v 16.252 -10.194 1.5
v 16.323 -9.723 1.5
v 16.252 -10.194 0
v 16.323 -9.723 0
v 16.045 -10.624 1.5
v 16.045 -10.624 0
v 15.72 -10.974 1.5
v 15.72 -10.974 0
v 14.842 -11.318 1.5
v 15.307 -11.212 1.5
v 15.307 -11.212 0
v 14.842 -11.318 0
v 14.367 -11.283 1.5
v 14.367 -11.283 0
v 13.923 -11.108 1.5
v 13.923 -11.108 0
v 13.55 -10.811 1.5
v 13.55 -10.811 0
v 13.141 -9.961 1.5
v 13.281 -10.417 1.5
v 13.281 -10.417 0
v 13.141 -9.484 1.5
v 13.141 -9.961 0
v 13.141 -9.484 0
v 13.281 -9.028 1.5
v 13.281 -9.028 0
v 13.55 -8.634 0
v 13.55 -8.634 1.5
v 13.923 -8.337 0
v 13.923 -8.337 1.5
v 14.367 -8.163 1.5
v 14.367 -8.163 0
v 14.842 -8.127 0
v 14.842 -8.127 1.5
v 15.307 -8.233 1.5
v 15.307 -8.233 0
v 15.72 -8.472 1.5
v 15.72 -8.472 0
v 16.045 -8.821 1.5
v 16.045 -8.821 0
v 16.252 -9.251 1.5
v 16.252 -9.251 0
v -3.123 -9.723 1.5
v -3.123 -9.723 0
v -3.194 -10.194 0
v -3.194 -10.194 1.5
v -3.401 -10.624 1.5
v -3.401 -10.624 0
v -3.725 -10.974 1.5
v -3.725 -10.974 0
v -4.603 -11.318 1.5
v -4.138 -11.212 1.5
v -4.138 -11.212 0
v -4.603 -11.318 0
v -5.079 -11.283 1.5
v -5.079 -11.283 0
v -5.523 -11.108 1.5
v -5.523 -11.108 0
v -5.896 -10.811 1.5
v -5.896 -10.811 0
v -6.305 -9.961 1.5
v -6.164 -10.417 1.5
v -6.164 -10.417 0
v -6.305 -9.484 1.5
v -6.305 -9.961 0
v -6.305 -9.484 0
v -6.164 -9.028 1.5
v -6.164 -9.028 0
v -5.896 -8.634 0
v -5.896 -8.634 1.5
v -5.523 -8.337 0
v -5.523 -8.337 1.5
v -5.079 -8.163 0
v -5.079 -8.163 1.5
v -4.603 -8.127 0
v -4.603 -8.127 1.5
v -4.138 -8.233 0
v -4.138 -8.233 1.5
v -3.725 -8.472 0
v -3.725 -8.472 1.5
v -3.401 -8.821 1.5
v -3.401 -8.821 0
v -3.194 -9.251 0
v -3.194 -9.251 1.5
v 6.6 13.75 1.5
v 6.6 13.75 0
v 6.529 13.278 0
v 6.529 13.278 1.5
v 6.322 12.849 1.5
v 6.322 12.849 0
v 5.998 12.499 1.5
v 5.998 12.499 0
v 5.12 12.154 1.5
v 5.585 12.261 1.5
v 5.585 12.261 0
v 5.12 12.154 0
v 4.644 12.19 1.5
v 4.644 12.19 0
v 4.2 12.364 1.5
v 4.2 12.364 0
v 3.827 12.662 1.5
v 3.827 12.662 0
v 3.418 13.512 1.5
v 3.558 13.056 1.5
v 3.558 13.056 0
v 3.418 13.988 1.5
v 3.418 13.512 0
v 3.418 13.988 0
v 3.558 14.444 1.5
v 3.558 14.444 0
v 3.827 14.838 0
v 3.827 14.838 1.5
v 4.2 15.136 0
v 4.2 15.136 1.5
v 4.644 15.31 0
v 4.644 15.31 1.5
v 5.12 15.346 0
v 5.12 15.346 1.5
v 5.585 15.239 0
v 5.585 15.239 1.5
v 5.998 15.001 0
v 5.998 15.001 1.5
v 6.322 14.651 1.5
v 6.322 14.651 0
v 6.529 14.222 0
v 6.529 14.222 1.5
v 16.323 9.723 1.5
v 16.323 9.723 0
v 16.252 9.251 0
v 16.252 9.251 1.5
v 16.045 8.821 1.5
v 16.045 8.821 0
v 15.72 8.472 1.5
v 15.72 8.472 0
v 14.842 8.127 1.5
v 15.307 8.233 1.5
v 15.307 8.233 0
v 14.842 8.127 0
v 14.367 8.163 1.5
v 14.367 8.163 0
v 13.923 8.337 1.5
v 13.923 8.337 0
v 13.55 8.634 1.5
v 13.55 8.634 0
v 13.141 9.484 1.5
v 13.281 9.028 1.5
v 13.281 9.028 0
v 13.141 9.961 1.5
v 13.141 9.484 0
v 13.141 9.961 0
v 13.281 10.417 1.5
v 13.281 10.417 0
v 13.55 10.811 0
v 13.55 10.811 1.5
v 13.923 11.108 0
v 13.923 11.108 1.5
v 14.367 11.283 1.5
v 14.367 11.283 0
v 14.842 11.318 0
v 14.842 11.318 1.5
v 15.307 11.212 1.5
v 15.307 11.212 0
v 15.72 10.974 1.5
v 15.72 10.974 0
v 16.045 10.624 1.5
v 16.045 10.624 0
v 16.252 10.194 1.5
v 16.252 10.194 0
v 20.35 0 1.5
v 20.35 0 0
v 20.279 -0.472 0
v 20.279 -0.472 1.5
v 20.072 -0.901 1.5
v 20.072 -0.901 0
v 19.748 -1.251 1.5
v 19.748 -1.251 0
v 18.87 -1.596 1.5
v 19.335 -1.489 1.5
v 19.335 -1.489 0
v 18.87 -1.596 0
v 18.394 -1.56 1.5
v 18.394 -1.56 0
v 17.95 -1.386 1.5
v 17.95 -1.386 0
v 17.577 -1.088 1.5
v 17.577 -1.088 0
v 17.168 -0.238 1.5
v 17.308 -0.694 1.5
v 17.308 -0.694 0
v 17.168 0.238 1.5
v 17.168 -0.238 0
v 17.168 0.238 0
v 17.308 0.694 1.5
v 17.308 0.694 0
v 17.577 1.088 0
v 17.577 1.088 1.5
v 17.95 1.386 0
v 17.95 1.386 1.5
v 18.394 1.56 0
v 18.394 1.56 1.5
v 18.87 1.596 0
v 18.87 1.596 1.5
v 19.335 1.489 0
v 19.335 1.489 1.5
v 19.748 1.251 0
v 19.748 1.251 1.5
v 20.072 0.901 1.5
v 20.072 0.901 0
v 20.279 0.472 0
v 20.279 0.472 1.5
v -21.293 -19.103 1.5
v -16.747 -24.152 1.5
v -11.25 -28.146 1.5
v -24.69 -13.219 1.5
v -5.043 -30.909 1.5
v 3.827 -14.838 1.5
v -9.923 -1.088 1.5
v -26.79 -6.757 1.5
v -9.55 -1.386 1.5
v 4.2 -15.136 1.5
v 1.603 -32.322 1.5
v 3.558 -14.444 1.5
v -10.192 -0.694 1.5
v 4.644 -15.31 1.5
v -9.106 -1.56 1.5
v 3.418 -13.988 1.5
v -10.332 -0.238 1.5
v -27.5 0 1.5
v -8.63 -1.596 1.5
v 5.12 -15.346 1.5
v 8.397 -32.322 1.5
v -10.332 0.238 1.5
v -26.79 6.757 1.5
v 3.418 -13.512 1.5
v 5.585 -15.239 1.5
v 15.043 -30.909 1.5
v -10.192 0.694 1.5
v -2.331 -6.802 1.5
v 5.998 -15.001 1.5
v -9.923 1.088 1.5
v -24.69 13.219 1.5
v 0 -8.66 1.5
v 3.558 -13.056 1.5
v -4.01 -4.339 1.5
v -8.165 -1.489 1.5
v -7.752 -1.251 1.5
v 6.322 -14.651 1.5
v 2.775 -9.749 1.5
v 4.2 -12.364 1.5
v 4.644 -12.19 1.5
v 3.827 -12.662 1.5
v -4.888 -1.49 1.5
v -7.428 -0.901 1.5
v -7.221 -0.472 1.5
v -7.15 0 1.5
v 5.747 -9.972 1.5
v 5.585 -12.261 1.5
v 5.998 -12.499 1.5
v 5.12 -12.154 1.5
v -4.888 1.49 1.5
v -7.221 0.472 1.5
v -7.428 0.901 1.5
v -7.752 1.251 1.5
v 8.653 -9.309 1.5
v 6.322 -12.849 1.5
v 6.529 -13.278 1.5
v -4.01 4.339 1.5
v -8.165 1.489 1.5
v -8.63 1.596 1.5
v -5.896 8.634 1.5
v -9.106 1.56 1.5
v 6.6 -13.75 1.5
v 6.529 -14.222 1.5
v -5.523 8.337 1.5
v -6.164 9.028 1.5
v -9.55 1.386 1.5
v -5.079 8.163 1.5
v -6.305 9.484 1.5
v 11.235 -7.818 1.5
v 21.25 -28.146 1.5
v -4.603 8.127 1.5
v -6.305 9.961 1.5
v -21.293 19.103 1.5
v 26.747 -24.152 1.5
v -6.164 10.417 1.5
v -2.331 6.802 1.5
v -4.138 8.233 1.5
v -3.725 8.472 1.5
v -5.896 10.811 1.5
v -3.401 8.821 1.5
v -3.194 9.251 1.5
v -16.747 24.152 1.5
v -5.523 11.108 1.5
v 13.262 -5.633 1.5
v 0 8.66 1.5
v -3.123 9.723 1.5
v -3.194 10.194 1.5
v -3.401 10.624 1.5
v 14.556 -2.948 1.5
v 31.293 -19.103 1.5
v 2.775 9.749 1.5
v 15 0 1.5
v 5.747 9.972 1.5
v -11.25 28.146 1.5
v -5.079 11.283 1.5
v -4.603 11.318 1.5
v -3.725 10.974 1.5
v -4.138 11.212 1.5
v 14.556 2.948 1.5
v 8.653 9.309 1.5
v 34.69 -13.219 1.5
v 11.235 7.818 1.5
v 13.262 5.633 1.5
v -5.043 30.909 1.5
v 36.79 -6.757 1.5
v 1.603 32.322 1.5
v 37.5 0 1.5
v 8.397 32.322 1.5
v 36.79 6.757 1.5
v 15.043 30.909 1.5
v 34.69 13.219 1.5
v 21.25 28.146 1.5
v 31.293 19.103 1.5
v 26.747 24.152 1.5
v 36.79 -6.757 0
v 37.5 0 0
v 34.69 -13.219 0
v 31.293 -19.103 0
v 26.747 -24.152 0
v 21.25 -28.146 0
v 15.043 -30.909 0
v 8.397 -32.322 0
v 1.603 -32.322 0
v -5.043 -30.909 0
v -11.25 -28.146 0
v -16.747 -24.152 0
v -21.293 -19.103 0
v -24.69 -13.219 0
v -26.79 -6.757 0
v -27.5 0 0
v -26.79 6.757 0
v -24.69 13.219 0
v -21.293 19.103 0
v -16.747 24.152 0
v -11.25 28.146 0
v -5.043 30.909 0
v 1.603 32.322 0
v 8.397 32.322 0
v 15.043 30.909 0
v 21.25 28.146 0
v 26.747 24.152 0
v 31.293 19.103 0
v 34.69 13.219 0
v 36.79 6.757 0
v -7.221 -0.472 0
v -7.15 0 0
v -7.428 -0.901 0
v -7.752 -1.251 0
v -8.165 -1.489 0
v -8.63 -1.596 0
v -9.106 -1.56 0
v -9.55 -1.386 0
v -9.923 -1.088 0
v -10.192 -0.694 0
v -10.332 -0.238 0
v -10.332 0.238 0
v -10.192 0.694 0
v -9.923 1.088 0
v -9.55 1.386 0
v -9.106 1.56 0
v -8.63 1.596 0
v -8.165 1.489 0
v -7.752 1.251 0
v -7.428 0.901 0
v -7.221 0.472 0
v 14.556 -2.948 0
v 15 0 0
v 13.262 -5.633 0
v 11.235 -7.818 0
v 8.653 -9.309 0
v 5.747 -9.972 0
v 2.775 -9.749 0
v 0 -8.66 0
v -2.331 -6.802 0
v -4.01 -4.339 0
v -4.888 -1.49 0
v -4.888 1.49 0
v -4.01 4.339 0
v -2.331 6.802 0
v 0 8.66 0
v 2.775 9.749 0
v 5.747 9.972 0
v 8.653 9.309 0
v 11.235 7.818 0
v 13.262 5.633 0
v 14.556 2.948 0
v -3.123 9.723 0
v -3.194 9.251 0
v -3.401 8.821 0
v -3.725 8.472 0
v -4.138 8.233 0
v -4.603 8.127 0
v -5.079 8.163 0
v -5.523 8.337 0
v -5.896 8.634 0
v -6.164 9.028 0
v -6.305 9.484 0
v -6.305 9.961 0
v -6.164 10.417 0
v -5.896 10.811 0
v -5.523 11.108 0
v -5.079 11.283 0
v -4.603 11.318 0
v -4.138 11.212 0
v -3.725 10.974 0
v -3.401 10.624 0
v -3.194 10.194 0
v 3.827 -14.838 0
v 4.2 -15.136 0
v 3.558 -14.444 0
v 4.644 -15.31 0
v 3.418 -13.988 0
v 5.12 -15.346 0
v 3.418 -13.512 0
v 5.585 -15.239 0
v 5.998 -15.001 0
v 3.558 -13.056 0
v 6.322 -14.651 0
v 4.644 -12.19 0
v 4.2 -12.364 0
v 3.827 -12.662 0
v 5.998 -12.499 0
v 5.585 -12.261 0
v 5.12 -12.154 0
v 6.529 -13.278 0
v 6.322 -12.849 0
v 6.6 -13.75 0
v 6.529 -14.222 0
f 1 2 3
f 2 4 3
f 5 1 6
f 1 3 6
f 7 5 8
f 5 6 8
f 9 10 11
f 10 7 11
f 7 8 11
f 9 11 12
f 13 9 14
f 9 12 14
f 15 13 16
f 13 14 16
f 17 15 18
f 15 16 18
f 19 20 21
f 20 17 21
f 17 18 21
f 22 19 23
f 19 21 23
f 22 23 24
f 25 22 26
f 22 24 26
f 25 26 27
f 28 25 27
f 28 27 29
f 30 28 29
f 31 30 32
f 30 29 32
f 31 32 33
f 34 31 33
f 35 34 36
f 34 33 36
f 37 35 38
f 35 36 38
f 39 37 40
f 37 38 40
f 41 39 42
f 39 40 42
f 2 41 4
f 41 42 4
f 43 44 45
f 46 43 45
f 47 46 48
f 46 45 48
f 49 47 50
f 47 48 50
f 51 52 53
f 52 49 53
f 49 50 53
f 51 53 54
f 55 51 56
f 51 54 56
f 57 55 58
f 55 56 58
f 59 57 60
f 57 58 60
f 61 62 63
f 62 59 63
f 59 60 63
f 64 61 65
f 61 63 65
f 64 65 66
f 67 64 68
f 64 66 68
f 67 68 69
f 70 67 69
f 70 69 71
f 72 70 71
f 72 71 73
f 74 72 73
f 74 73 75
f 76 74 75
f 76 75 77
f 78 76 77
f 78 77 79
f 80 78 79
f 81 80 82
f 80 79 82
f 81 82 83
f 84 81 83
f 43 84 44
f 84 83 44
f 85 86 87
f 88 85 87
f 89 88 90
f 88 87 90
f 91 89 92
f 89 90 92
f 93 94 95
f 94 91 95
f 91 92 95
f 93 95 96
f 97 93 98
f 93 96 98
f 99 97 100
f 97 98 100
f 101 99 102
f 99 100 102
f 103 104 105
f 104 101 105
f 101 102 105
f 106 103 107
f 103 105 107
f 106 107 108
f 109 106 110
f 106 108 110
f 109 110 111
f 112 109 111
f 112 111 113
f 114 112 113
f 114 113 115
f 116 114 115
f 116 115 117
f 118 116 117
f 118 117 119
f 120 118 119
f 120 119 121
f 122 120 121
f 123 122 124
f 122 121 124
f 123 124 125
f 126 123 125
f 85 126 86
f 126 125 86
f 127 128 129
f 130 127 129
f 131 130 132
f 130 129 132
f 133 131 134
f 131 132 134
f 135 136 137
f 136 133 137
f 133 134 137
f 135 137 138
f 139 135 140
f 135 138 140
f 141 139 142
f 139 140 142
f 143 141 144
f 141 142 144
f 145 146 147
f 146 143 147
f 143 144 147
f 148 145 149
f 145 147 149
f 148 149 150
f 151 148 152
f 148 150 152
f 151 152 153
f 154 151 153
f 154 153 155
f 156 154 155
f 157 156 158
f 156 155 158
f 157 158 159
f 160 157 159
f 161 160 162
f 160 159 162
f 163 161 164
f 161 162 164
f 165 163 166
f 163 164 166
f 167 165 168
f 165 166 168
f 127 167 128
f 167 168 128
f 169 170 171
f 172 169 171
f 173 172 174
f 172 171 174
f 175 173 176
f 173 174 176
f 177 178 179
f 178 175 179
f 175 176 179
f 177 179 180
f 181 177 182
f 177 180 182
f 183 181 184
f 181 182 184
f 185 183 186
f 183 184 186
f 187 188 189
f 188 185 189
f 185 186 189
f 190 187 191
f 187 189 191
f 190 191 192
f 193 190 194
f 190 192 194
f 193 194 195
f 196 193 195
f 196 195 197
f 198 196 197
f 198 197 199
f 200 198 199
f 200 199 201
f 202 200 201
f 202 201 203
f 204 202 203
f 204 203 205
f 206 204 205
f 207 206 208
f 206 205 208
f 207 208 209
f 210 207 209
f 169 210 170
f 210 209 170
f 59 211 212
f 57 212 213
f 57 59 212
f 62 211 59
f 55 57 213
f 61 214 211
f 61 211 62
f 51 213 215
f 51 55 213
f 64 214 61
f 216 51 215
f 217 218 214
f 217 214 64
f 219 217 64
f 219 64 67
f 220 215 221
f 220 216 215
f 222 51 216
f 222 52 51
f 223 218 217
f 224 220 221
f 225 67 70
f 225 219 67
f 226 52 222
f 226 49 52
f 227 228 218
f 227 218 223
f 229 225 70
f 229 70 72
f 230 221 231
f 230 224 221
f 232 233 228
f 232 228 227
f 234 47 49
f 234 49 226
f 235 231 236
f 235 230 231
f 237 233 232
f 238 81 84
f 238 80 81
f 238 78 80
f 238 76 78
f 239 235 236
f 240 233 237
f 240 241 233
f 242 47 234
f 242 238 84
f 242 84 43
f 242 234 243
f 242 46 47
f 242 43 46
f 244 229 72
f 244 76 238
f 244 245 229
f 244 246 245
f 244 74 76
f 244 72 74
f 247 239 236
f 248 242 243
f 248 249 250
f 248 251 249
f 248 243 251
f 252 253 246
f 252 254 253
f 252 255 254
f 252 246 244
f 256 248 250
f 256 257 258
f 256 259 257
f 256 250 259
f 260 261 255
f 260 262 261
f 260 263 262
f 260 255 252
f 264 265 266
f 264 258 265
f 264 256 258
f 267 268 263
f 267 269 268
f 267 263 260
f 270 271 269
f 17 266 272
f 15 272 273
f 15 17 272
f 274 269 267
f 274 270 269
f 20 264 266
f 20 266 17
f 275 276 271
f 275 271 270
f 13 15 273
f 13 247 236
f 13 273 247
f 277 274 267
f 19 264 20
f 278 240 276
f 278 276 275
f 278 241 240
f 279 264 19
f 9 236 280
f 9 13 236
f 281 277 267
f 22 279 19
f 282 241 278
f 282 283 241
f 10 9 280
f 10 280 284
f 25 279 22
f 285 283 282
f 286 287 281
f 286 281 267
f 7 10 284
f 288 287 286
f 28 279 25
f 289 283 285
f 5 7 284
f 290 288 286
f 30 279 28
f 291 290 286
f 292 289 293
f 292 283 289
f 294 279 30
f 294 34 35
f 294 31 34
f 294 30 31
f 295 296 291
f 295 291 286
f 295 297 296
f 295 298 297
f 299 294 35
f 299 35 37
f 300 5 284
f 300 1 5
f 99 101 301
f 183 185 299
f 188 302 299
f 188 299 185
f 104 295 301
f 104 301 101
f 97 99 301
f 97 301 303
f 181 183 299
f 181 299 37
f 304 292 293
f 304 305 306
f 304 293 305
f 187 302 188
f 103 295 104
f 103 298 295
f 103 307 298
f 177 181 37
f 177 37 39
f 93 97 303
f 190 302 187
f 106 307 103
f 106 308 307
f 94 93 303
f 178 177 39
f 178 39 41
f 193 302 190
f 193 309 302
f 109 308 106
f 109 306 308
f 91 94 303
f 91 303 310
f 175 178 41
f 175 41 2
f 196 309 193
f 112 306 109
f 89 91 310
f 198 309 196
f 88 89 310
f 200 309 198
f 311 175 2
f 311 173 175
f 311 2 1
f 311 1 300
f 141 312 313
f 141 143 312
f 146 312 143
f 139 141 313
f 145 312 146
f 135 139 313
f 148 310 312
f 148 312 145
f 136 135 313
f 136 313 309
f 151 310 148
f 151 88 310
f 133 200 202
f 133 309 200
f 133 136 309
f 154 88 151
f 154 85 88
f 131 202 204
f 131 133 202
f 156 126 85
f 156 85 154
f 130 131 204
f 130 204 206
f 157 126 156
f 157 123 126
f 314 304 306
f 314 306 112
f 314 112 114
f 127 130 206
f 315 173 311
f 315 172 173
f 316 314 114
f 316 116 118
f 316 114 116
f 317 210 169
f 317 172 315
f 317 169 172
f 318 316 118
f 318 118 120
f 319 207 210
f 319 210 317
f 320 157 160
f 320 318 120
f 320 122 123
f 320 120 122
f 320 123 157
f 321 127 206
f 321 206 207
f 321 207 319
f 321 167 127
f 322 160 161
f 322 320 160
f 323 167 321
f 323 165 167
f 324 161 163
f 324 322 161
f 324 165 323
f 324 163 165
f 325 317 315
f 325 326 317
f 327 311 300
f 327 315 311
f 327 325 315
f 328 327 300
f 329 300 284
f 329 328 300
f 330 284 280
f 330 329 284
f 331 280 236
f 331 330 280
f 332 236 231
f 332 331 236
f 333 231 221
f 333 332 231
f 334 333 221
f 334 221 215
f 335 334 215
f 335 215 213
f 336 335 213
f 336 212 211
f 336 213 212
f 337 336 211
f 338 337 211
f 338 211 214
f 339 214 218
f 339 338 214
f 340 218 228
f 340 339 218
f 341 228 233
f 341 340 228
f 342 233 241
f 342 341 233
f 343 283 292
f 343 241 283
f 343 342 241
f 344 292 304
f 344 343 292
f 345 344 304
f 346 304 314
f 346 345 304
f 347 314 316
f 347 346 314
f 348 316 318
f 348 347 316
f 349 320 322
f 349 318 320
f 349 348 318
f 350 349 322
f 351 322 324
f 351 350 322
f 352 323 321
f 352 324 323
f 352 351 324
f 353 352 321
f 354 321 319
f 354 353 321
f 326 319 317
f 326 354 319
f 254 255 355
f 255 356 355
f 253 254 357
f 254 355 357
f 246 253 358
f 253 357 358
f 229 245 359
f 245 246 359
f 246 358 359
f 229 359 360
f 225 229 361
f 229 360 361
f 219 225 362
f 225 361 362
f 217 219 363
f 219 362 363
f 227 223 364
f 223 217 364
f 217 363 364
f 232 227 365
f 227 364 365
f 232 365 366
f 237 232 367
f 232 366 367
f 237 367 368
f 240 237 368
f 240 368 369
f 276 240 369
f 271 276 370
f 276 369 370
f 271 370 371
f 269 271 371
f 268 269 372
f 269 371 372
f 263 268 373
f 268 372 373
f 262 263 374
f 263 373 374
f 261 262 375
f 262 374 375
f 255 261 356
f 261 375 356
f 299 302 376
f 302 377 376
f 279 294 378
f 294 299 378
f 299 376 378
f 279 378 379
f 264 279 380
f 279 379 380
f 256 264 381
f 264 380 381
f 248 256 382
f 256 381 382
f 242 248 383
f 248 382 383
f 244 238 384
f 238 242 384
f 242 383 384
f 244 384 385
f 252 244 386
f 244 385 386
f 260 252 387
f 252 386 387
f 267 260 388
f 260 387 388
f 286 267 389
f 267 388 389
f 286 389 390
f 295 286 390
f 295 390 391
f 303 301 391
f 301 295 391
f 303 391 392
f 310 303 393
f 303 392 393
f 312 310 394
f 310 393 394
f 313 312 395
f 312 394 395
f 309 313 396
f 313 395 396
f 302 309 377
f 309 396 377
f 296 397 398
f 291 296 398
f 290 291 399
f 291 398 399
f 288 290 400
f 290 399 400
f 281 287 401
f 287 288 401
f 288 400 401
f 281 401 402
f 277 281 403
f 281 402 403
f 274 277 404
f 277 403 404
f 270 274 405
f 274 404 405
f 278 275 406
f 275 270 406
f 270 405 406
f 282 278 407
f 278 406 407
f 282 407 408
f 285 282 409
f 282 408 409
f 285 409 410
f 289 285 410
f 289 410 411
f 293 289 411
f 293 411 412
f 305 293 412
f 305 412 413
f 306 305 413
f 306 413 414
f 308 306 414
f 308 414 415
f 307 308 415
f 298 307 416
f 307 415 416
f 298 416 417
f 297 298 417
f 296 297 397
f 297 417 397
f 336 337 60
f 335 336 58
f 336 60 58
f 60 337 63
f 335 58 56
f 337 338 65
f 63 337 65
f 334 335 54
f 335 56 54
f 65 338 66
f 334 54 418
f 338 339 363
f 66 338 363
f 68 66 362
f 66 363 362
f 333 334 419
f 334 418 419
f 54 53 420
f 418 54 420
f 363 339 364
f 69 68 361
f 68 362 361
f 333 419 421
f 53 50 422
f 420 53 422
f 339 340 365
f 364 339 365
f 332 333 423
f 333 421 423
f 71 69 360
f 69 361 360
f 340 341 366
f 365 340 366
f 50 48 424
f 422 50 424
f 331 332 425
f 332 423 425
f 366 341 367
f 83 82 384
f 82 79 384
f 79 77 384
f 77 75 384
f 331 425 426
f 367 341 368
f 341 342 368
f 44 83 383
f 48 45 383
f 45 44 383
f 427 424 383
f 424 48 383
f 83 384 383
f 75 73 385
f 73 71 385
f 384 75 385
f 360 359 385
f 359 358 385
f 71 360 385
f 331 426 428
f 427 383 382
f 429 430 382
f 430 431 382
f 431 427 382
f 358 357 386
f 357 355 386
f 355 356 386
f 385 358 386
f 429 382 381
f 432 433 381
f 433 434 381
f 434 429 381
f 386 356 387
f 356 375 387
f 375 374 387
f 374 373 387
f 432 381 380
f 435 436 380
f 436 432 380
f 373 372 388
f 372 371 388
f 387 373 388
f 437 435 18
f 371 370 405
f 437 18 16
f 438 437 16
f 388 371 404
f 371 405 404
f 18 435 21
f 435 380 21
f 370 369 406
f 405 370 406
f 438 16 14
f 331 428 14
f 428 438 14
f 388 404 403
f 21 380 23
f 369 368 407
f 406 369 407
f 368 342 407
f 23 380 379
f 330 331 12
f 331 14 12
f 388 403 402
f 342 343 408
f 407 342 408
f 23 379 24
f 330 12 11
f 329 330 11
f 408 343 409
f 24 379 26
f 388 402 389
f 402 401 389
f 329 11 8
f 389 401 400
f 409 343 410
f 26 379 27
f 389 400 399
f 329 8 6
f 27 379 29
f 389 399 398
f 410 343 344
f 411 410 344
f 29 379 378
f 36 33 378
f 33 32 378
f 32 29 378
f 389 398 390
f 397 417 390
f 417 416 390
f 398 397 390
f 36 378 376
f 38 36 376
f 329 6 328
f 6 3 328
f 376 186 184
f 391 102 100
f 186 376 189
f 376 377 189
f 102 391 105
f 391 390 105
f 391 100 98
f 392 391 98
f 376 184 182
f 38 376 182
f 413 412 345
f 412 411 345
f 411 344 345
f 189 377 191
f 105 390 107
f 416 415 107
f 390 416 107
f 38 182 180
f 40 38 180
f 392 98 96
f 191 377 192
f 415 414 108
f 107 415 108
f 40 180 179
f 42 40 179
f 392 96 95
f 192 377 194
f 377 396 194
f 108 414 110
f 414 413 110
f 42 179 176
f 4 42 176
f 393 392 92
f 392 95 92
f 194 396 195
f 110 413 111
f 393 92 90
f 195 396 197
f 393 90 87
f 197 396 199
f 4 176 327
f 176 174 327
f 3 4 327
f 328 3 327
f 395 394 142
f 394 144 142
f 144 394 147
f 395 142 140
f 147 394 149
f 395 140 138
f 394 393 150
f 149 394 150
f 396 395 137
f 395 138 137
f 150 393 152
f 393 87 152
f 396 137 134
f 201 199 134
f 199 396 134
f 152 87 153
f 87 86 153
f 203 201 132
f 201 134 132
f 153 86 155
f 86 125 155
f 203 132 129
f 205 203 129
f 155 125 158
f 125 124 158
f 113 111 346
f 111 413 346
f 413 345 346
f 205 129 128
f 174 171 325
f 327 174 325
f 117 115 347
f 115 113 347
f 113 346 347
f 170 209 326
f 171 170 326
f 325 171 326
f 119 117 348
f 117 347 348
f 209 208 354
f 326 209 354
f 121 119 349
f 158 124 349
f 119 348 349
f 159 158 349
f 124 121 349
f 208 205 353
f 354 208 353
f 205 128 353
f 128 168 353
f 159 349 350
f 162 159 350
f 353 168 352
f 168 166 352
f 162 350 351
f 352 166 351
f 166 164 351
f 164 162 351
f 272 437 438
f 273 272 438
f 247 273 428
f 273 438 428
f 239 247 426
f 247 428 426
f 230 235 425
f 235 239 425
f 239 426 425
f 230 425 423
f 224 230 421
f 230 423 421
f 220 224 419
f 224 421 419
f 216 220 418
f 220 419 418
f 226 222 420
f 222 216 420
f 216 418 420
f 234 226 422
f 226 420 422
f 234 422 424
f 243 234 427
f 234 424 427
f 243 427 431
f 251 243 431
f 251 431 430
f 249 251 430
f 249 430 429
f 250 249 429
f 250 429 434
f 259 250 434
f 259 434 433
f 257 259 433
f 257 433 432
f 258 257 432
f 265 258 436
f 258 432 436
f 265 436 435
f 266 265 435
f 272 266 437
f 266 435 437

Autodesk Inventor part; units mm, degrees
ref_plane "YZ Plane" through (0, 0, 0) normal (1, 0, 0) x (0, 1, 0)
ref_plane "XZ Plane" through (0, 0, 0) normal (0, 1, 0) x (-1, 0, 0)
ref_plane "XY Plane" through (0, 0, 0) normal (0, 0, 1) x (1, 0, 0)
sketch "スケッチ1" plane through (0, 0, 0) normal (0, 0, 1) x (1, 0, 0)
  line L0 (25, -23) -> (-25, -23) construction
  line L1 (25, 23) -> (25, -23) construction
  line L2 (-25, 23) -> (25, 23) construction
  arc A0 (8.5, 1.9365) -> (7.0484, 3.4357) centre (7, 1.9365) ccw construction
  line L3 (8.5, 1.9365) -> (8.5, -1.9365) construction
  arc A1 (7.0484, -3.4357) -> (8.5, -1.9365) centre (7, -1.9365) ccw construction
  arc A2 (2.9516, -3.4357) -> (7.0484, -3.4357) centre (5, 0) ccw construction
  arc A3 (1.5, -1.9365) -> (2.9516, -3.4357) centre (3, -1.9365) ccw construction
  line L4 (1.5, -1.9365) -> (1.5, 1.9365) construction
  arc A4 (2.9516, 3.4357) -> (1.5, 1.9365) centre (3, 1.9365) ccw construction
  arc A5 (7.0484, 3.4357) -> (2.9516, 3.4357) centre (5, 0) ccw construction
  circle A6 centre (5, 0) radius 27.5 construction
  circle A7 centre (5, 0) radius 15.5 construction
  circle A8 centre (5, 0) radius 13.75 construction
  line L5 (25, 14) -> (25, 23) construction
  line L6 (-275, 23) -> (25, 23) construction
  line L7 (-275, 23) -> (-275, 14) projected
  line L8 (-275, 14) -> (25, 14) construction
  line L9 (25, -23) -> (25, -14) construction
  line L10 (-275, -14) -> (25, -14) construction
  line L11 (-275, -14) -> (-275, -23) projected
  line L12 (-275, -23) -> (25, -23) construction
  circle A9 centre (18.75, 0) radius 1.6
  circle A10 centre (14.7227, 9.7227) radius 1.6
  circle A11 centre (5, 13.75) radius 1.6
  circle A12 centre (-4.7227, 9.7227) radius 1.6
  circle A13 centre (-8.75, 0) radius 1.6
  circle A14 centre (-4.7227, -9.7227) radius 1.6
  circle A15 centre (5, -13.75) radius 1.6
  circle A16 centre (14.7227, -9.7227) radius 1.6
  circle A17 centre (5, 0) radius 10
  circle A18 centre (5, 0) radius 32.5
  point P0 (0, 0)
  dimension "d3" = 27.5
  dimension "d1" = 55
  dimension "d2" = 31
  dimension "d4" = 3.2
  dimension "d7" = 360
  dimension "d9" = 20
  dimension "d12" = 65
extrude "押し出し1" add sketch "スケッチ1" along normal blind 1.5
properties part number "先端アームパーツA" material "アルミニウム 6061"
